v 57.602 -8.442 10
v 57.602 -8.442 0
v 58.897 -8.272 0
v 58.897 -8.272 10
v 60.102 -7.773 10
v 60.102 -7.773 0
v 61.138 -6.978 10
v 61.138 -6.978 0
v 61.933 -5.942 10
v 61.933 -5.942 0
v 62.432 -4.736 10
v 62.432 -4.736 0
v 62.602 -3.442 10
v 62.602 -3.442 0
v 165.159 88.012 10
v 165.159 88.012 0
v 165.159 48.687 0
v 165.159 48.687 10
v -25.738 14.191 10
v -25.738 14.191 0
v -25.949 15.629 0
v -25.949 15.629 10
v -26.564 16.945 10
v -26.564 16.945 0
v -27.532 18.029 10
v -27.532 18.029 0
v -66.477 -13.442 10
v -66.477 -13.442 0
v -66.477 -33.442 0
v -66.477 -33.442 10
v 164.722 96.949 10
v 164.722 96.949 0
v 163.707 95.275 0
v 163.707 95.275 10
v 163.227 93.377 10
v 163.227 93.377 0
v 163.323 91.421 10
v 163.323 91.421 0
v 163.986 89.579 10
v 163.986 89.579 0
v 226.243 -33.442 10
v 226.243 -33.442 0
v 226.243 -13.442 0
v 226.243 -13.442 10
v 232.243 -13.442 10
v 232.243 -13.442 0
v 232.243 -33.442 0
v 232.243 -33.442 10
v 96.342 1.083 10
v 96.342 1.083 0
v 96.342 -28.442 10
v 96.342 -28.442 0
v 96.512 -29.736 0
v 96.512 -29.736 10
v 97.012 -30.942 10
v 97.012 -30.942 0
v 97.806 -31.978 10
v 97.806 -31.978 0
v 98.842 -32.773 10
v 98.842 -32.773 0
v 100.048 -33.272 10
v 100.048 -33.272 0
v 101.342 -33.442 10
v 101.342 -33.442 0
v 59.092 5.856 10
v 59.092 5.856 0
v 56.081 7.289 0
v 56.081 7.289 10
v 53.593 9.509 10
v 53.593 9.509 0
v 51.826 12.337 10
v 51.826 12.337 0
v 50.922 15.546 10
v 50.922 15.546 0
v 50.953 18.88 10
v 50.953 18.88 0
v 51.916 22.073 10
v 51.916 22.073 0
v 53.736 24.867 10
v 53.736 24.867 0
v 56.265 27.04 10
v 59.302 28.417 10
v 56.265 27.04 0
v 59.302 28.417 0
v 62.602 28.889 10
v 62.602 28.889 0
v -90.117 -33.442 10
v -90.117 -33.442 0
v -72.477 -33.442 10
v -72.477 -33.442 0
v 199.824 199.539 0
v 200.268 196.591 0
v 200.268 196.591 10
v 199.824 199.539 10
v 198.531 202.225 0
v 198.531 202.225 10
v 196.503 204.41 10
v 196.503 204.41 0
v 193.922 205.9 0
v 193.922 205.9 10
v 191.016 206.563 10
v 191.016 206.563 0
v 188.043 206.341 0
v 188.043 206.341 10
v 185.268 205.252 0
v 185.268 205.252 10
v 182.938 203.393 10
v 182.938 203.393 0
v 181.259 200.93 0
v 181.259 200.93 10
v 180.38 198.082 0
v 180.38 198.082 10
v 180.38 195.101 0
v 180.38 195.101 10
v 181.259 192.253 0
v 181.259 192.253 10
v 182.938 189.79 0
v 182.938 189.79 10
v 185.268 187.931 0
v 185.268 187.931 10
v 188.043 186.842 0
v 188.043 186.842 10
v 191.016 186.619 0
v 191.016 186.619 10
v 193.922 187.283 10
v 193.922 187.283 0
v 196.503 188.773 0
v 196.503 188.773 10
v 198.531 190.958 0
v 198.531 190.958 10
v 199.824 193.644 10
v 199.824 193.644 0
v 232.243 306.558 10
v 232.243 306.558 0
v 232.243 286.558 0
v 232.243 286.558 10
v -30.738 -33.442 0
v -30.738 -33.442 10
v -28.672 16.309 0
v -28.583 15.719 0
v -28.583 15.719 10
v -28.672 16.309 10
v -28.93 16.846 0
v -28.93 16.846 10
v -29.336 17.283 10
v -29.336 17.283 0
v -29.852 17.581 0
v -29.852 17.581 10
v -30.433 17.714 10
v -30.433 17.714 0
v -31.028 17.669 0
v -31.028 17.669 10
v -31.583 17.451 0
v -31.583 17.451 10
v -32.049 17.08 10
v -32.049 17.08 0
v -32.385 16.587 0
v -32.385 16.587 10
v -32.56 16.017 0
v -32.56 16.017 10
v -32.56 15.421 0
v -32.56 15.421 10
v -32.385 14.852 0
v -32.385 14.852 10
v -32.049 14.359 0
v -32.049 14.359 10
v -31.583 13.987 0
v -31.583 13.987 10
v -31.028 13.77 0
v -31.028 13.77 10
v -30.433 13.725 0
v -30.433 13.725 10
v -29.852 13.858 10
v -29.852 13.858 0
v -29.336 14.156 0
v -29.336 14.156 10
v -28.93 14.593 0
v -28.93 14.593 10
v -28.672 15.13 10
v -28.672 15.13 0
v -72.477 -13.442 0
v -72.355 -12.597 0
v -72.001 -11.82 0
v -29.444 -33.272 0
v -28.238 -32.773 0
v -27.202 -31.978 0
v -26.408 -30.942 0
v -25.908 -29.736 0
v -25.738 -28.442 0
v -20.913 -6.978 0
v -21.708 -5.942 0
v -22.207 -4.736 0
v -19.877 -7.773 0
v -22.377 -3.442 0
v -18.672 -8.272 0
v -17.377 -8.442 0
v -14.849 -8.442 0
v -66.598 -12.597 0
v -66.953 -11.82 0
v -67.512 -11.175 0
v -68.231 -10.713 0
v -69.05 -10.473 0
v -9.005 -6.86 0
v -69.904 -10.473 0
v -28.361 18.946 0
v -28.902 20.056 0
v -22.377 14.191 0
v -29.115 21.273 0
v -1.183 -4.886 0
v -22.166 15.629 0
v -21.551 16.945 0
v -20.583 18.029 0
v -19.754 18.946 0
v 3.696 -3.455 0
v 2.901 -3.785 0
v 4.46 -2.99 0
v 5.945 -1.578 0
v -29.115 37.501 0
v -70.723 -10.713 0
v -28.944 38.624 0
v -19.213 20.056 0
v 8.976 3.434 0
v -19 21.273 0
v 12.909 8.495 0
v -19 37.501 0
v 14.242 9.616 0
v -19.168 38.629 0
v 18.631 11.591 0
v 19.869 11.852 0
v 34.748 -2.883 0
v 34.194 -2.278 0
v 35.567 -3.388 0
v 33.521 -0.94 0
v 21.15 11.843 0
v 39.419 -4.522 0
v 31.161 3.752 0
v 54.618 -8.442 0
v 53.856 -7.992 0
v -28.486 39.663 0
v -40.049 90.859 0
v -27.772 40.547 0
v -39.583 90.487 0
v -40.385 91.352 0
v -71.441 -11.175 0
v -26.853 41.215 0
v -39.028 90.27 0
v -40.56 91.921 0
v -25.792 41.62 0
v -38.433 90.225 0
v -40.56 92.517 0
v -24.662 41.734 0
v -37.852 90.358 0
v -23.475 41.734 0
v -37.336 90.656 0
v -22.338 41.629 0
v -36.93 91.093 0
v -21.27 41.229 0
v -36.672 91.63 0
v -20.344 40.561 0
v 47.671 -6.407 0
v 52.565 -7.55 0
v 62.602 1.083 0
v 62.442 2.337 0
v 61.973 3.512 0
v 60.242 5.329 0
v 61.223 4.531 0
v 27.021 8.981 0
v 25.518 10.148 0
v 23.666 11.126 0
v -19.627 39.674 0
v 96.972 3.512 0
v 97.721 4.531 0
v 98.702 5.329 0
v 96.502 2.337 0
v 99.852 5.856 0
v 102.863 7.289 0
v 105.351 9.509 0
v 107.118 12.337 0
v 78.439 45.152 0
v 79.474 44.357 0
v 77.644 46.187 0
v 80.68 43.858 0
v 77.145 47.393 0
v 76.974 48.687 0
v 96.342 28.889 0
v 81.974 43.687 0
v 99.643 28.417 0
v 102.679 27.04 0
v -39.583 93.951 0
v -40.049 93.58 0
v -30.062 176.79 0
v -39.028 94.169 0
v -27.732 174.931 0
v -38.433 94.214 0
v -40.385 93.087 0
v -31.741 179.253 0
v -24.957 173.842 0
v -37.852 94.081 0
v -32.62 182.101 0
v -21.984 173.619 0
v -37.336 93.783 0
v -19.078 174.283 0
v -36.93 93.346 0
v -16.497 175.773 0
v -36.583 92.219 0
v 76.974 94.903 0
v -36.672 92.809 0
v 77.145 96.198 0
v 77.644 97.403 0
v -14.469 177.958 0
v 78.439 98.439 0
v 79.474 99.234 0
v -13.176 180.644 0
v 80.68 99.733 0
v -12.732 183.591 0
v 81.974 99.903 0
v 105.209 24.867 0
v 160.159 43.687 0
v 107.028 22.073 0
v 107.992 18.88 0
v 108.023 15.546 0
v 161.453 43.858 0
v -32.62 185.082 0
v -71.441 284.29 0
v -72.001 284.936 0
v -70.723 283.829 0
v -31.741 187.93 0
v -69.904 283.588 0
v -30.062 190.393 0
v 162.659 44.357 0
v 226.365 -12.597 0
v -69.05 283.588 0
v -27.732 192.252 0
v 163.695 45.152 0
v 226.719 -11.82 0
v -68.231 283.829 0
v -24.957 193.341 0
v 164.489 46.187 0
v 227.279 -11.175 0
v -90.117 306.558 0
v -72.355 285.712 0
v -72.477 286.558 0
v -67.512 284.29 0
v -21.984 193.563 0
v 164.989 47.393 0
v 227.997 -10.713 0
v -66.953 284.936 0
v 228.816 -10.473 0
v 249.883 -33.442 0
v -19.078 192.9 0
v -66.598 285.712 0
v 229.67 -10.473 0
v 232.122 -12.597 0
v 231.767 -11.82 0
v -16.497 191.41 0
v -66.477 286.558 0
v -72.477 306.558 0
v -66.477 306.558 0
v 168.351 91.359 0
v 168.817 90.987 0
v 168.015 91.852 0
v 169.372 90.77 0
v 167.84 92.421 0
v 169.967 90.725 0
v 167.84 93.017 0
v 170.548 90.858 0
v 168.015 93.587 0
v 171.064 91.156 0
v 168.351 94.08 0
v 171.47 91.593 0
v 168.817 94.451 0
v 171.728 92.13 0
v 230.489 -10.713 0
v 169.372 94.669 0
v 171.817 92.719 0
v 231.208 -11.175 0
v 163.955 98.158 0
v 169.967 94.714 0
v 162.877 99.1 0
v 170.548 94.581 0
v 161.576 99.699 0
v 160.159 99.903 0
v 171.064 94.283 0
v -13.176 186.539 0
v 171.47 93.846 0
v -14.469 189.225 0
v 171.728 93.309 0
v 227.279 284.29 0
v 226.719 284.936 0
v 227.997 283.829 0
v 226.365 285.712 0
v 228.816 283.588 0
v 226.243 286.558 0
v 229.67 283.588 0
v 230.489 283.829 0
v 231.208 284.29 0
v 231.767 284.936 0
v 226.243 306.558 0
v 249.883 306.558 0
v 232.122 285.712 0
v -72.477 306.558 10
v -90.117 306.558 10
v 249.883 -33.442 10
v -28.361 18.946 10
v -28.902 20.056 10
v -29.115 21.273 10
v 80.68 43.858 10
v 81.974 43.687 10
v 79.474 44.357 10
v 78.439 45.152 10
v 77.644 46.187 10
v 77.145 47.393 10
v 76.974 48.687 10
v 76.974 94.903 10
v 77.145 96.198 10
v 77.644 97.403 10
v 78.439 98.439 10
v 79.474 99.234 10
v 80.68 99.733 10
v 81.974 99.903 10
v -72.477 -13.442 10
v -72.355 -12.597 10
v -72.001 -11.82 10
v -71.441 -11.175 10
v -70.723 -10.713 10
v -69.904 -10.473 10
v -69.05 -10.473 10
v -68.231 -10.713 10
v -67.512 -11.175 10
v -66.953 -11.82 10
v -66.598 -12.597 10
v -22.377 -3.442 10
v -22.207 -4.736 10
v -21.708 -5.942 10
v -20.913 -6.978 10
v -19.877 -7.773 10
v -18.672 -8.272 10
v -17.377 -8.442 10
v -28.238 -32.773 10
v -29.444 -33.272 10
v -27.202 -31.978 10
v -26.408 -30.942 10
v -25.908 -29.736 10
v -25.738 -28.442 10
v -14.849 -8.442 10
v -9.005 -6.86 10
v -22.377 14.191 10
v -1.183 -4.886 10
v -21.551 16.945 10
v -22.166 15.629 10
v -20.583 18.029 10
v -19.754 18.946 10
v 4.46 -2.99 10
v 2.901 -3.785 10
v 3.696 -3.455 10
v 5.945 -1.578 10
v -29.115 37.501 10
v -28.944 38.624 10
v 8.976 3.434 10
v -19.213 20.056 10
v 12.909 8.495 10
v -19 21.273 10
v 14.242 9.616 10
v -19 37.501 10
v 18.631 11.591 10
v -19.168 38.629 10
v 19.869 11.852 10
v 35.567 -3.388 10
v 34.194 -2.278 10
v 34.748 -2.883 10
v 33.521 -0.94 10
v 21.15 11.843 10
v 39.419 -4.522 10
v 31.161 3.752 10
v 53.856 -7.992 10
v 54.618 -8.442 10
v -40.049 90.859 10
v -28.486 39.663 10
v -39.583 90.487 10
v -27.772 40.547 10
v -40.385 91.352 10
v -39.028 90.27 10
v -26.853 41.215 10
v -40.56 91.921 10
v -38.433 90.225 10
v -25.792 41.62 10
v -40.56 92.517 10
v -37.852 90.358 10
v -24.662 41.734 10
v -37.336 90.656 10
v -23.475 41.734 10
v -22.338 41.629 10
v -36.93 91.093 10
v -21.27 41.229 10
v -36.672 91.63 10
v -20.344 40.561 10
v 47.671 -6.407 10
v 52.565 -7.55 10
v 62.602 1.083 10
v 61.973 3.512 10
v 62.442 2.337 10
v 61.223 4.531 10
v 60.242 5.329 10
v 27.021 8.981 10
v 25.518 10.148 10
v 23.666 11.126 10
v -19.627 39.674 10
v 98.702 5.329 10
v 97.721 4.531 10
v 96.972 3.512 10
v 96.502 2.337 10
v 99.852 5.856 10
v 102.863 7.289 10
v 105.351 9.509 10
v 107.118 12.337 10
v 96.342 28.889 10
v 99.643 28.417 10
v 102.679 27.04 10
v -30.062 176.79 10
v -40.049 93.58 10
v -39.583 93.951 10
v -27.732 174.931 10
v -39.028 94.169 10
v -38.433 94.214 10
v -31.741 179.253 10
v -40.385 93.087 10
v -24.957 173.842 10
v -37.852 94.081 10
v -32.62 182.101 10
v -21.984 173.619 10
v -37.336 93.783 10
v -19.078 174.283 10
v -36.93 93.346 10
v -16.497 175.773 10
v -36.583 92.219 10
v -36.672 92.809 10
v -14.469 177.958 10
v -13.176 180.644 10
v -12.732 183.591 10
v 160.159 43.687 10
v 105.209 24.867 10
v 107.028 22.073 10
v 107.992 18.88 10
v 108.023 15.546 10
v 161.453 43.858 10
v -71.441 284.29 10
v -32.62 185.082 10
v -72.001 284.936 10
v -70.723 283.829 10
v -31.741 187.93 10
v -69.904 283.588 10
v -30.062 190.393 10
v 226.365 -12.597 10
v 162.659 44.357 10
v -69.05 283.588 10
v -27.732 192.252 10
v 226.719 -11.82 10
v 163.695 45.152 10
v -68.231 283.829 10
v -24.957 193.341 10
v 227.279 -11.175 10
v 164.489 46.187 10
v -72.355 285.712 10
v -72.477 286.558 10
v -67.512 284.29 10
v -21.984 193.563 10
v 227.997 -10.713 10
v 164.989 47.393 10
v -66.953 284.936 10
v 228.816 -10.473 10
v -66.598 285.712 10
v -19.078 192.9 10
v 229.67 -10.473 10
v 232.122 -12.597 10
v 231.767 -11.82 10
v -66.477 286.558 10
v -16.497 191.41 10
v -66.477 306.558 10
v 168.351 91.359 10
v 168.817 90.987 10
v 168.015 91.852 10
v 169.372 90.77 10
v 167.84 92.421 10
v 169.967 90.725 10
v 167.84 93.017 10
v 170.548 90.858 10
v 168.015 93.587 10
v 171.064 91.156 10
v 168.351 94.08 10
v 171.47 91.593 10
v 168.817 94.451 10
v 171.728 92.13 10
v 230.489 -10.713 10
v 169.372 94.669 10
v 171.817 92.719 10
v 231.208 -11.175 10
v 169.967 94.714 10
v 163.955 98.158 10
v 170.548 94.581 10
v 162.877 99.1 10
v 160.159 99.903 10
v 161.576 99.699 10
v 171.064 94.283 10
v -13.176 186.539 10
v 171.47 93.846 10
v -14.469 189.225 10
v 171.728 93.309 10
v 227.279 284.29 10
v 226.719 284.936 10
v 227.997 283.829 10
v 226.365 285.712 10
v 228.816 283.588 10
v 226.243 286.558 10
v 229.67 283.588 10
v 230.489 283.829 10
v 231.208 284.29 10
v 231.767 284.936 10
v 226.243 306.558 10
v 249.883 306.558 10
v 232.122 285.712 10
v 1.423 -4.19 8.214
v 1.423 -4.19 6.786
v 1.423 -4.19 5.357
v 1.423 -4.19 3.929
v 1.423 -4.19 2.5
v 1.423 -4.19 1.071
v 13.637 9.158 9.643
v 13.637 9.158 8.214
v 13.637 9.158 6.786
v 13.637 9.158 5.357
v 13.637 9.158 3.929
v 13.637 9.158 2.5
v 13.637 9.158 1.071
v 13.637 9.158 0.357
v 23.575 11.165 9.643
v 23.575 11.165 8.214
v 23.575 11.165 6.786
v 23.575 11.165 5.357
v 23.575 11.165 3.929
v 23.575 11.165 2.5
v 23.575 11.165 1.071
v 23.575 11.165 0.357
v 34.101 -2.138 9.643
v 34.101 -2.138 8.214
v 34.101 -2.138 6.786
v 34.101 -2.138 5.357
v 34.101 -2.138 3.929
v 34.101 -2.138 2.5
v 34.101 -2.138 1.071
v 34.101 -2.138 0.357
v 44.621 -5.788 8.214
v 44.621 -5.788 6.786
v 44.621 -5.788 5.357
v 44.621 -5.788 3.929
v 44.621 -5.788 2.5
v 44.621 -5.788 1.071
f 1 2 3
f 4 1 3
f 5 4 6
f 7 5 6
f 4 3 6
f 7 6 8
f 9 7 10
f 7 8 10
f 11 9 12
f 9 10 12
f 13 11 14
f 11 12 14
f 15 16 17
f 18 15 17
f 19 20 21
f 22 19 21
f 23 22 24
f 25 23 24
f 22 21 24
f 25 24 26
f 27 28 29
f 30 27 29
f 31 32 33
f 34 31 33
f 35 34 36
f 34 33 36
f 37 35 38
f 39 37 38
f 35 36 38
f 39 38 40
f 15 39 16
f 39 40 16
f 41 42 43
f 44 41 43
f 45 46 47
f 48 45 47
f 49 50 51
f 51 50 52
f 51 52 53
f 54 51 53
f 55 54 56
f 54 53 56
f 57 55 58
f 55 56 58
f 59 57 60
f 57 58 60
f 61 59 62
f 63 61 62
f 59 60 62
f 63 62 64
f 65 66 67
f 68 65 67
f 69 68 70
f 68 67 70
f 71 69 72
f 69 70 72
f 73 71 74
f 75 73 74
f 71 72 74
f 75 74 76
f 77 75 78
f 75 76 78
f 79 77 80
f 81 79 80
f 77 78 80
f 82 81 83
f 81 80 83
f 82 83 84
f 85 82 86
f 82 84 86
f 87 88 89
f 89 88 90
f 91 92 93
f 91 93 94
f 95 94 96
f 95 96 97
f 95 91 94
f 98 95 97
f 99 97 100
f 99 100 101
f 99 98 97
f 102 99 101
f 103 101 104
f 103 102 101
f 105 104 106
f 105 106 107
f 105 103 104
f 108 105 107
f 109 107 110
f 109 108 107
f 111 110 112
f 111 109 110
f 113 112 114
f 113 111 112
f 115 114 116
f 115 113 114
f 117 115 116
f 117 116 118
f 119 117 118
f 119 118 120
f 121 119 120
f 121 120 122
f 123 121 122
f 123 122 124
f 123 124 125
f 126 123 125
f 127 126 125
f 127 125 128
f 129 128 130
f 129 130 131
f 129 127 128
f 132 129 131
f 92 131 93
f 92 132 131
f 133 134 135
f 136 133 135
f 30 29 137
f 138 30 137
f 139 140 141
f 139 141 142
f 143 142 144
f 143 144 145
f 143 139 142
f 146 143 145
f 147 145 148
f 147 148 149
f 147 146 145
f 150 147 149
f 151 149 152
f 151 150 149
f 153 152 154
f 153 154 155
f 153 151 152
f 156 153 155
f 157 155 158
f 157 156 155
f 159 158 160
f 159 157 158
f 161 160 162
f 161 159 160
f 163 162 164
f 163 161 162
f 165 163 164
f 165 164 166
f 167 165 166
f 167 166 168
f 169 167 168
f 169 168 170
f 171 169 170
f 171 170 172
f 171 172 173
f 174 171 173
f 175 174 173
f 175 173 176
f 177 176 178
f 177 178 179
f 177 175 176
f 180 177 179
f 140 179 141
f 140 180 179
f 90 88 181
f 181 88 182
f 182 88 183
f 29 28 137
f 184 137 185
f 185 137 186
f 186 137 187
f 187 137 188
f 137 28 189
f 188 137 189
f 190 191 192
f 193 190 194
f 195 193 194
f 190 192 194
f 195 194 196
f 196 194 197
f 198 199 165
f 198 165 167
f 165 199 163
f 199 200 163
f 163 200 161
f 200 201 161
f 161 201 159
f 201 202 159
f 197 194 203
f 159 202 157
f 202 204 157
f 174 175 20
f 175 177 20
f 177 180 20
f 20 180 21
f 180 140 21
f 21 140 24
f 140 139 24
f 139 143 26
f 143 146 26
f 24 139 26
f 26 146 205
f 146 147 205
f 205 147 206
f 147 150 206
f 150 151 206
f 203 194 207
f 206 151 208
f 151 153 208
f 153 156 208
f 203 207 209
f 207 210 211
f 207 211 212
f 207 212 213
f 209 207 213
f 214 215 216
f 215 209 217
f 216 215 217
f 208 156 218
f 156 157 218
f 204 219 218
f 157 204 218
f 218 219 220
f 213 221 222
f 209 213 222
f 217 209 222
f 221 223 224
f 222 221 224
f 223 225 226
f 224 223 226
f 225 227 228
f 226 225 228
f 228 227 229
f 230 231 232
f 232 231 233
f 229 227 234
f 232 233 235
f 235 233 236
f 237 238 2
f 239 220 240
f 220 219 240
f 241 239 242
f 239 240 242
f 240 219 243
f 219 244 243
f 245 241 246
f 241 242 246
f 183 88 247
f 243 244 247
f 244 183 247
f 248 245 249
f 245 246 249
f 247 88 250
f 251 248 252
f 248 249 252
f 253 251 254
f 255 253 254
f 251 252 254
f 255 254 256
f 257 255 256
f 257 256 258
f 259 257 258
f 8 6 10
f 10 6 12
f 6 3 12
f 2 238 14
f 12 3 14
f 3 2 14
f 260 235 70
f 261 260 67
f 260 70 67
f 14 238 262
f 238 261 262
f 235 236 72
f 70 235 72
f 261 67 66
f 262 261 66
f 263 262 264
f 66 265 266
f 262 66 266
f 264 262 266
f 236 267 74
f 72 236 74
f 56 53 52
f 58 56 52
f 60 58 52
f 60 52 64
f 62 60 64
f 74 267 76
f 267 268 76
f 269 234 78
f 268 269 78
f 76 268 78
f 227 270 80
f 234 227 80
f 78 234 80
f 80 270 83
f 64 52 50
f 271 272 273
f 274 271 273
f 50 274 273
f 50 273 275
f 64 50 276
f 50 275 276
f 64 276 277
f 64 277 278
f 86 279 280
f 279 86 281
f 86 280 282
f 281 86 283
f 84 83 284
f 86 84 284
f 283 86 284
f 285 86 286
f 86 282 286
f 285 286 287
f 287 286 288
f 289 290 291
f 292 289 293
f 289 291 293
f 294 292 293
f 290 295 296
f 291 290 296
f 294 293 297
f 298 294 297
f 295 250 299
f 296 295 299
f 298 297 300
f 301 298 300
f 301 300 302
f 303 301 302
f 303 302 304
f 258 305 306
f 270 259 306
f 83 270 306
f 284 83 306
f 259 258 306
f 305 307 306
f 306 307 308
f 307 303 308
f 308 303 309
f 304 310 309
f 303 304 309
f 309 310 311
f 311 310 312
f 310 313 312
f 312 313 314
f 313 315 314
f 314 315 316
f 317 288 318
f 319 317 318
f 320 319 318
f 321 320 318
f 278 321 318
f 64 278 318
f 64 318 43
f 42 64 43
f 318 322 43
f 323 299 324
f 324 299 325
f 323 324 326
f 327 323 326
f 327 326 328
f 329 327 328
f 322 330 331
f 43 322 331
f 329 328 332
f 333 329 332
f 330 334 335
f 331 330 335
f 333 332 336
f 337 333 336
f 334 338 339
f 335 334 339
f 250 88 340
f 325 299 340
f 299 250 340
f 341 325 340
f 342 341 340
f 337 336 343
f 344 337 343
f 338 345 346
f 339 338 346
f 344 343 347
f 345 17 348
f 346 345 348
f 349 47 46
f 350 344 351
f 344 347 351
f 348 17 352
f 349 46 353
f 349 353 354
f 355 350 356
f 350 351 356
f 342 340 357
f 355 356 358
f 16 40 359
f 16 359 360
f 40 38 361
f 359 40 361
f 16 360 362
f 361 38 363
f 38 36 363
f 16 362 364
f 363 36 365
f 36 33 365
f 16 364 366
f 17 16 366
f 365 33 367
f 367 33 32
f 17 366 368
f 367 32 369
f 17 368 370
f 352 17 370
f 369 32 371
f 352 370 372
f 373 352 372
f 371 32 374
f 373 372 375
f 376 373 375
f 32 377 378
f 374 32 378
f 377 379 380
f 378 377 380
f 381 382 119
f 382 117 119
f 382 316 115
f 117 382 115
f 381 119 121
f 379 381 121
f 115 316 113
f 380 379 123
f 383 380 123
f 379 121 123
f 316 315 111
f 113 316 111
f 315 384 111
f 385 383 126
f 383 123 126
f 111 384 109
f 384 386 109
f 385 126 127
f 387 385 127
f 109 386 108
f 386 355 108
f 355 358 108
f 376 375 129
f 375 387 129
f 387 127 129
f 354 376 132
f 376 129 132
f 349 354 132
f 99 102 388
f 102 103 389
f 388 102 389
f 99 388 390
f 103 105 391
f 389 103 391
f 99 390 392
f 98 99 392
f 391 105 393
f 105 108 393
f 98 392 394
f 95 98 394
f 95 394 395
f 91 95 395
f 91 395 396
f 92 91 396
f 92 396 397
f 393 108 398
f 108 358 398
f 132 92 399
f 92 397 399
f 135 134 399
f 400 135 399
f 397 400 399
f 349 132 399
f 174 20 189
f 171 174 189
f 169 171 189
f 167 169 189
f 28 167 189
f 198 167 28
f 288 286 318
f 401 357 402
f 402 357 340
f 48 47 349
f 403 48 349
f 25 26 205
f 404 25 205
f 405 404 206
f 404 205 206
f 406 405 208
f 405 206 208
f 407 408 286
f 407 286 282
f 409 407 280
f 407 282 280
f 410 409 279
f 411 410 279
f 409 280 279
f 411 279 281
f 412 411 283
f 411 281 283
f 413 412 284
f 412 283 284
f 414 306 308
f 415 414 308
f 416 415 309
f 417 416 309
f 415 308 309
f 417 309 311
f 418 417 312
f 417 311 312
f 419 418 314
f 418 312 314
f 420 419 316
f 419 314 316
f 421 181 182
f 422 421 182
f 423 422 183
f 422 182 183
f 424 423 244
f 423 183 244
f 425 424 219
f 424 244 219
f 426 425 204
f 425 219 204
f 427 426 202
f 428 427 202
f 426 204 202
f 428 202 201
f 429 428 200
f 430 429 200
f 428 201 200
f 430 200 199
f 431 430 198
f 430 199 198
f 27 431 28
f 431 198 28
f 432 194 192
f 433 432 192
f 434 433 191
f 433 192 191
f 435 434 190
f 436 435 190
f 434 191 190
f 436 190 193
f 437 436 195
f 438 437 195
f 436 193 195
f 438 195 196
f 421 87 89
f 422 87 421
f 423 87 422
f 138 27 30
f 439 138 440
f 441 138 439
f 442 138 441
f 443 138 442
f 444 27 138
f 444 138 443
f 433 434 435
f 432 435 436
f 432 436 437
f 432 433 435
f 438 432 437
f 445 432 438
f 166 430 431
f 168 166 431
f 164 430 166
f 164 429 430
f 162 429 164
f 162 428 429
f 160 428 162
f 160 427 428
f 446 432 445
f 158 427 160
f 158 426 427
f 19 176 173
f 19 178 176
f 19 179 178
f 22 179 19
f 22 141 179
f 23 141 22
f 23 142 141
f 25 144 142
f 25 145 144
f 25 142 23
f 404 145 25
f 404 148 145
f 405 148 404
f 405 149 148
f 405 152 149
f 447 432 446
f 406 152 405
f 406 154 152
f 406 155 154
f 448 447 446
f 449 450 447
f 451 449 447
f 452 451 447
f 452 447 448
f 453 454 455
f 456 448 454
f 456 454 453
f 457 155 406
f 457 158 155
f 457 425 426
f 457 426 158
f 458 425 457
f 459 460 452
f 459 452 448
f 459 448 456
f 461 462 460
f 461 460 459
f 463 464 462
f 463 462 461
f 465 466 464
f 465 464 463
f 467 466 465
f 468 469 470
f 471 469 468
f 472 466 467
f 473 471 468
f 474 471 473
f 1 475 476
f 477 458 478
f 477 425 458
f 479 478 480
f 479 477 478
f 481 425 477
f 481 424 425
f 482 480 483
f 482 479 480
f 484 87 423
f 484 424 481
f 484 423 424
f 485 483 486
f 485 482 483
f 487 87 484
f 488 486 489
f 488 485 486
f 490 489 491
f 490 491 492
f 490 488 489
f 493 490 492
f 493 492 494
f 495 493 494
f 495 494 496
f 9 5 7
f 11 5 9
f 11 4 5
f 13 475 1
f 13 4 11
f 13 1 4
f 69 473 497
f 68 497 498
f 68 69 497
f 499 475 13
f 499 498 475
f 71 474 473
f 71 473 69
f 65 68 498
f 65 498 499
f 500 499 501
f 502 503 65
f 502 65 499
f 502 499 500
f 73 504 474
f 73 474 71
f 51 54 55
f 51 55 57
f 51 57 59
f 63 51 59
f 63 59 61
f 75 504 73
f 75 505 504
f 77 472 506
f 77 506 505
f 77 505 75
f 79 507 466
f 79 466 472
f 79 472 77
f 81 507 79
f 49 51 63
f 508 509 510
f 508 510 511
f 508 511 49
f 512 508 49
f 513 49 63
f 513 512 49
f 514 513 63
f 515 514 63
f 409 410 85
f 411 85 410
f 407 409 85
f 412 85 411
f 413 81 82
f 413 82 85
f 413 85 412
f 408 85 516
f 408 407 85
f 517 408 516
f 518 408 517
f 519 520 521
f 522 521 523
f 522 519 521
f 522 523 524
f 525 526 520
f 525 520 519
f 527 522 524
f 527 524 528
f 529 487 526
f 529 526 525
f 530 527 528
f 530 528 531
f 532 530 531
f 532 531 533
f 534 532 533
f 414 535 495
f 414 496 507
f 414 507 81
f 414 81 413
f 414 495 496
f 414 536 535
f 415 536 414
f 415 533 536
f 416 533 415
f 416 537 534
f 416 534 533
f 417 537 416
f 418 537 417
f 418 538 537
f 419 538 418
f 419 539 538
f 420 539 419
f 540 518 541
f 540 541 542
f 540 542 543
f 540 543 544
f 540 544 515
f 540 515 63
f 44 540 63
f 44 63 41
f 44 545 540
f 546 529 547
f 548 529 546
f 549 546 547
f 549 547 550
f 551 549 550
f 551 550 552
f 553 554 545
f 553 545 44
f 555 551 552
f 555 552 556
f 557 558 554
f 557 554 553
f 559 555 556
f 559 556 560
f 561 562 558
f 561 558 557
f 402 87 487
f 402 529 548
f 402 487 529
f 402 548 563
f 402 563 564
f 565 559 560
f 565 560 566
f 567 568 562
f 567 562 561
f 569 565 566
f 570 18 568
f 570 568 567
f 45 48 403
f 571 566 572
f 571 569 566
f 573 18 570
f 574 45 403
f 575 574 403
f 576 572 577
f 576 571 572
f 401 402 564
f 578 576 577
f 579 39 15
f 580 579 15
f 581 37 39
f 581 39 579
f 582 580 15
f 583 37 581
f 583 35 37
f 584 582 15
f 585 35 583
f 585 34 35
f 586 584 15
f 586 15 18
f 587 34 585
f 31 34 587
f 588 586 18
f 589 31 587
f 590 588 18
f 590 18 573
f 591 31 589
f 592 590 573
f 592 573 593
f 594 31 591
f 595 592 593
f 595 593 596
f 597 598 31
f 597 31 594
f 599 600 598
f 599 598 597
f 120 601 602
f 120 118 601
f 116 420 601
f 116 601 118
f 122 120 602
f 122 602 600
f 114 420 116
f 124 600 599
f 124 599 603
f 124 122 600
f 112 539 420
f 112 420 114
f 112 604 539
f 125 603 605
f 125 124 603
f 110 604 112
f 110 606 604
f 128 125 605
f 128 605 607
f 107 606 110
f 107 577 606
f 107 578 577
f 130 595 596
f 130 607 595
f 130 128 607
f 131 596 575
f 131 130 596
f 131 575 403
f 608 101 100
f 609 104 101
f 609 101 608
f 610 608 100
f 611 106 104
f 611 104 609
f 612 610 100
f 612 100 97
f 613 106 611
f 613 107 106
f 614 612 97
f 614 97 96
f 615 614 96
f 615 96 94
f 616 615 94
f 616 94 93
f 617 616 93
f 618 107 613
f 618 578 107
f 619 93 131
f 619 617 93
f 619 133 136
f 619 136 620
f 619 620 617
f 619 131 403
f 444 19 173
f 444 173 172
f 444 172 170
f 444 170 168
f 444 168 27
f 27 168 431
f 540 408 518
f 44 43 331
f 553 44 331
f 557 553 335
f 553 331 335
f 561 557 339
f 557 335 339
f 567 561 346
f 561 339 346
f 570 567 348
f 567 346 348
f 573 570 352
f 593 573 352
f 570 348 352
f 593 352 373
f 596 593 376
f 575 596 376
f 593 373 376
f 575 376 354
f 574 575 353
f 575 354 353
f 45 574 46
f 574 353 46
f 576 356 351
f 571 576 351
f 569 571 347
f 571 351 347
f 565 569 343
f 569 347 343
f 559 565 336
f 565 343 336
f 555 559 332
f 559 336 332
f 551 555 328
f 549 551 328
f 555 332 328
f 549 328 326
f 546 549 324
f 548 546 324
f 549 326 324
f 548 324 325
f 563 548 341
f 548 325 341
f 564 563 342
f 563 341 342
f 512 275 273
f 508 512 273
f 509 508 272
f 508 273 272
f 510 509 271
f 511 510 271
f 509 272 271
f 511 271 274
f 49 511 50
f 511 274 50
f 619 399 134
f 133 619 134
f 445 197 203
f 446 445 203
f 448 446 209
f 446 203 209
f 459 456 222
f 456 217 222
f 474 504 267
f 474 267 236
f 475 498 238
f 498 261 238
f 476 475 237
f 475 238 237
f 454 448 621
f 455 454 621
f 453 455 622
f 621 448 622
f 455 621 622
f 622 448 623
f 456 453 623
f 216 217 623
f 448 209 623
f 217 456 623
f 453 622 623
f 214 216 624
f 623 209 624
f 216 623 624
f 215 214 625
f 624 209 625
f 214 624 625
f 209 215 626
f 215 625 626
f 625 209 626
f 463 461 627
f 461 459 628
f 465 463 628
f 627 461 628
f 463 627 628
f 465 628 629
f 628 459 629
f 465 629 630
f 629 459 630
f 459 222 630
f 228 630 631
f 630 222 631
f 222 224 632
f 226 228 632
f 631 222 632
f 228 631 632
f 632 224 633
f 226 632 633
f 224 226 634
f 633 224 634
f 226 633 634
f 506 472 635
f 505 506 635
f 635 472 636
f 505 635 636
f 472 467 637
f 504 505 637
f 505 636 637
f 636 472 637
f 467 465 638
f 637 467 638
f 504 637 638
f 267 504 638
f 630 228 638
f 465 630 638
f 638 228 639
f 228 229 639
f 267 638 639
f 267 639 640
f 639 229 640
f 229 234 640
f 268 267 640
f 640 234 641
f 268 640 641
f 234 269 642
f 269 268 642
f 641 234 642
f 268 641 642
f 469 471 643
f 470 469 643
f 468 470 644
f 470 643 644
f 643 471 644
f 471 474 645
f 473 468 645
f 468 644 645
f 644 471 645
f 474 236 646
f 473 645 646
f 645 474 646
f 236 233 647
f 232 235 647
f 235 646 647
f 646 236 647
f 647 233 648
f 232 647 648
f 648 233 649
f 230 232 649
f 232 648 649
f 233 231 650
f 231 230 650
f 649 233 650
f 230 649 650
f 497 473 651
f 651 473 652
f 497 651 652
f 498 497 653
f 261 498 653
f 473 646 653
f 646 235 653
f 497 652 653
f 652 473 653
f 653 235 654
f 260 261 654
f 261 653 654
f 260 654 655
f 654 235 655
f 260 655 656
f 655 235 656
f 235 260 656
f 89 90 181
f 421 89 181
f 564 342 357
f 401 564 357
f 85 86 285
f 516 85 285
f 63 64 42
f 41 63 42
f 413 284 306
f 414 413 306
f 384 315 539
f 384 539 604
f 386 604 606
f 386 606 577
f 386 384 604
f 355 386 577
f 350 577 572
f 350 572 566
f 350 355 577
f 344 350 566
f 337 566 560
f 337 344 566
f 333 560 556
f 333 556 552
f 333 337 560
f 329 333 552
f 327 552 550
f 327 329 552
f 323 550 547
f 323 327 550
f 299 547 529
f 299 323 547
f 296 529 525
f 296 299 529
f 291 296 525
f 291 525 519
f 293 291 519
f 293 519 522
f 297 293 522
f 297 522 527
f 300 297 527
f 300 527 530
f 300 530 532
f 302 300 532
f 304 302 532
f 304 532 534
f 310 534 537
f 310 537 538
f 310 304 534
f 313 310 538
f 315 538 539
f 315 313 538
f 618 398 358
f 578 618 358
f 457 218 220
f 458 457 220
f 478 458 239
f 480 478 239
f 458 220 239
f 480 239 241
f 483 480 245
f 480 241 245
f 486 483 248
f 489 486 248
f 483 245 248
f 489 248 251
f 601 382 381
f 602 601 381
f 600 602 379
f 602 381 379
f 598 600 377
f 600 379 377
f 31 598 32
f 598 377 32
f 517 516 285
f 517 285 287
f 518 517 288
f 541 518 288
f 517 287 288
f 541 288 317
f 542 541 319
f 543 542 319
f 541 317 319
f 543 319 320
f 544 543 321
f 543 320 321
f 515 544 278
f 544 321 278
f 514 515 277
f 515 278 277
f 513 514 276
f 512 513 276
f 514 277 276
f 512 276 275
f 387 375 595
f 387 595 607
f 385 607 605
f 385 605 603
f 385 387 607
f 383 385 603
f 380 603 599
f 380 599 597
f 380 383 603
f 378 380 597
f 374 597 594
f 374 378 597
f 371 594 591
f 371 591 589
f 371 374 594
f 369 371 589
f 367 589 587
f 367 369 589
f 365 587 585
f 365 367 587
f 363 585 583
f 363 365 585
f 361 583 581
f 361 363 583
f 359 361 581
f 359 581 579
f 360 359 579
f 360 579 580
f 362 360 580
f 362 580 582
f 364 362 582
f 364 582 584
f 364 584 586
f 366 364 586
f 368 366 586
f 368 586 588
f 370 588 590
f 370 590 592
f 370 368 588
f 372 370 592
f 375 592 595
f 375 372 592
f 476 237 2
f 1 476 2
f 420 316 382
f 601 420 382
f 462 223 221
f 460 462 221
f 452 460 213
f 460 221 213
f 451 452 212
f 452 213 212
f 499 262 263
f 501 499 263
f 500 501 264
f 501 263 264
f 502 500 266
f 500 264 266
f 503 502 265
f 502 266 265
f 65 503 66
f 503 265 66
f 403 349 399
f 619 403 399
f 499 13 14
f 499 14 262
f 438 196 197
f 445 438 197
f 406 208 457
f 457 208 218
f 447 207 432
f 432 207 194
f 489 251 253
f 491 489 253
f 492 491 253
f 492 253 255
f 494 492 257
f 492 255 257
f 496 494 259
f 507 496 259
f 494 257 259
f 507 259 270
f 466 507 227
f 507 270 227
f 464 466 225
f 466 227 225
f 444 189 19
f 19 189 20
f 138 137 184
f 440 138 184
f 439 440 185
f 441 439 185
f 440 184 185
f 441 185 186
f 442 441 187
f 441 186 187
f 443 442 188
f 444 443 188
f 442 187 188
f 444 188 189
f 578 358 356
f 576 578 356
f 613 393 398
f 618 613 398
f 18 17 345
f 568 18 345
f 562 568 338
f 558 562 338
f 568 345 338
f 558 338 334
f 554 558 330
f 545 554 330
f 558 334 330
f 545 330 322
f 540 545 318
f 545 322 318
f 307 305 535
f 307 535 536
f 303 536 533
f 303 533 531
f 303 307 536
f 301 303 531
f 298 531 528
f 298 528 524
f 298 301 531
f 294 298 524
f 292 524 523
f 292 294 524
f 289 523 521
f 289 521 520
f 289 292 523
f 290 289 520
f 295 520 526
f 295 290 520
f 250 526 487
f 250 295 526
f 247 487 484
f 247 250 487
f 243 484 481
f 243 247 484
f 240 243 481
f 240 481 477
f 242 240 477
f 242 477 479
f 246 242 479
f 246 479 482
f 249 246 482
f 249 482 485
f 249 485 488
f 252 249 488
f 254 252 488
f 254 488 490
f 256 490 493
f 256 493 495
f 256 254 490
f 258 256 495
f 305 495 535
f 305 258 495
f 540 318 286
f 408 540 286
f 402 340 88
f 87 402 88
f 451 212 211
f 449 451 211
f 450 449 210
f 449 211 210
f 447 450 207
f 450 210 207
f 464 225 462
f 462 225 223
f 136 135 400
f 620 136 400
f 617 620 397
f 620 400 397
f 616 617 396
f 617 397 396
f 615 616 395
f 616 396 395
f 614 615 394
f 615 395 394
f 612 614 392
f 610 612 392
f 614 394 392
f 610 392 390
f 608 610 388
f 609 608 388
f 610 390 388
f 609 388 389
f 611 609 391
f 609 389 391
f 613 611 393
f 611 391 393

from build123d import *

# Parameters (mm, degrees)
F0_R     = 2
F0_R_2   = 10
F1_DEPTH = 10


with BuildPart() as f1:
    # F0 (on Top) → F1 (new body)
    with BuildSketch(Plane.XY):
        with BuildLine():
            ThreePointArc((59.0919412169, 5.8556343452), (50.9526831397, 18.8804236674), (62.6024537054, 28.8891950556))
            Line((62.6024537054, 28.8891950556), (96.3418013123, 28.8891950556))
            ThreePointArc((96.3418013123, 28.8891950556), (107.991571878, 18.8804236674), (99.8523138008, 5.8556343452))
            ThreePointArc((99.8523138008, 5.8556343452), (97.3139335415, 4.0451239333), (96.3418013123, 1.0826450353))
            Line((96.3418013123, 1.0826450353), (96.3418013123, -3.4423905863))
            Line((96.3418013123, -3.4423905863), (96.3418013123, -28.4423905863))
            ThreePointArc((96.3418013123, -28.4423905863), (97.8062674064, -31.9779244922), (101.3418013123, -33.4423905863))
            Line((101.3418013123, -33.4423905863), (226.2431738165, -33.4423905863))
            Line((226.2431738165, -33.4423905863), (226.2431738165, -13.4423905863))
            ThreePointArc((226.2431738165, -13.4423905863), (229.2431738165, -10.4423905863), (232.2431738165, -13.4423905863))
            Line((232.2431738165, -13.4423905863), (232.2431738165, -33.4423905863))
            Line((232.2431738165, -33.4423905863), (249.8831738165, -33.4423905863))
            Line((249.8831738165, -33.4423905863), (249.8831738165, 306.5576094137))
            Line((249.8831738165, 306.5576094137), (232.2431738165, 306.5576094137))
            Line((232.2431738165, 306.5576094137), (232.2431738165, 286.5576094137))
            ThreePointArc((232.2431738165, 286.5576094137), (229.2431738165, 283.5576094137), (226.2431738165, 286.5576094137))
            Line((226.2431738165, 286.5576094137), (226.2431738165, 306.5576094137))
            Line((226.2431738165, 306.5576094137), (-66.4768261835, 306.5576094137))
            Line((-66.4768261835, 306.5576094137), (-66.4768261835, 286.5576094137))
            ThreePointArc((-66.4768261835, 286.5576094137), (-69.4768261835, 283.5576094137), (-72.4768261835, 286.5576094137))
            Line((-72.4768261835, 286.5576094137), (-72.4768261835, 306.5576094137))
            Line((-72.4768261835, 306.5576094137), (-90.1168261835, 306.5576094137))
            Line((-90.1168261835, 306.5576094137), (-90.1168261835, -33.4423905863))
            Line((-90.1168261835, -33.4423905863), (-72.4768261835, -33.4423905863))
            Line((-72.4768261835, -33.4423905863), (-72.4768261835, -13.4423905863))
            ThreePointArc((-72.4768261835, -13.4423905863), (-69.4768261835, -10.4423905863), (-66.4768261835, -13.4423905863))
            Line((-66.4768261835, -13.4423905863), (-66.4768261835, -33.4423905863))
            Line((-66.4768261835, -33.4423905863), (-30.7376475201, -33.4423905863))
            ThreePointArc((-30.7376475201, -33.4423905863), (-27.2021136142, -31.9779244922), (-25.7376475201, -28.4423905863))
            Line((-25.7376475201, -28.4423905863), (-25.7376475201, -3.4423905863))
            Line((-25.7376475201, -3.4423905863), (-25.7376475201, 14.191206688))
            ThreePointArc((-25.7376475201, 14.191206688), (-26.2085251586, 16.3094726378), (-27.5324677739, 18.0287609605))
            ThreePointArc((-27.5324677739, 18.0287609605), (-28.6705546596, 19.4817524546), (-29.1154945201, 21.2729683997))
            Line((-29.1154945201, 21.2729683997), (-29.1154945201, 37.5007453997))
            ThreePointArc((-29.1154945201, 37.5007453997), (-27.7723228668, 40.5471780201), (-24.6616755201, 41.7340793997))
            Line((-24.6616755201, 41.7340793997), (-23.4746474021, 41.7340793997))
            ThreePointArc((-23.4746474021, 41.7340793997), (-20.3442550444, 40.5612593781), (-18.9995925201, 37.5007453997))
            Line((-18.9995925201, 37.5007453997), (-18.9995925201, 21.2729683997))
            ThreePointArc((-18.9995925201, 21.2729683997), (-19.4445332952, 19.4817460524), (-20.5826230269, 18.0287486149))
            ThreePointArc((-20.5826230269, 18.0287486149), (-21.9065629195, 16.309461214), (-22.3774395201, 14.1911974832))
            Line((-22.3774395201, 14.1911974832), (-22.3774395201, -3.4423905863))
            ThreePointArc((-22.3774395201, -3.4423905863), (-20.9129734261, -6.9779244922), (-17.3774395201, -8.4423905863))
            Line((-17.3774395201, -8.4423905863), (-14.8488045963, -8.4423905863))
            add(Edge.make_bspline(
                [(-14.8488045963, -8.4423905863), (-13.8667230742, -8.0862149232), (-11.0675263436, -7.7368565701), (-9.5535565702, -6.9407787949), (-7.4752239657, -6.5093979511), (-6.0404658852, -6.1311557916), (-2.2864787406, -5.2030128278), (1.3475701923, -4.1847297196), (3.5611082397, -3.6822645324), (5.4819881536, -2.2869521331), (6.9236147383, -0.2928338043), (8.0909212332, 2.1536809326), (8.8018252555, 3.1130183139), (9.9066433173, 5.0149117757), (13.4740067588, 9.5337311578), (16.6201320308, 10.8141732124), (20.2607813027, 12.3757075827), (24.1416225167, 11.0663557699), (26.5751124317, 9.5057386468), (28.5212647481, 7.4945031555), (30.605514445, 4.8352932594), (31.5134198263, 3.0744433993), (32.6181776868, 1.1006609746), (33.5937461444, -1.0781289854), (34.6061736564, -3.5356368183), (40.2319928309, -4.632963348), (44.5783336596, -5.860680116), (49.0997891973, -6.6293952633), (53.6165002005, -7.7718986182), (54.4082808854, -8.2668507233), (54.6180656818, -8.4423905863)],
                knots=[0, 0, 0, 0, 0.0406361494, 0.0690843533, 0.0982832849, 0.1240792745, 0.1650586975, 0.2064474949, 0.237602636, 0.2688839918, 0.3023509551, 0.3363941823, 0.3586454287, 0.3892430987, 0.4390503332, 0.478234315, 0.5186842811, 0.5600640859, 0.5954673894, 0.6306059239, 0.6688365072, 0.6984296576, 0.7295419634, 0.7618620205, 0.7940667479, 0.8425634492, 0.8880772951, 0.9338149024, 0.9784648643, 1, 1, 1, 1], degree=3))
            Line((54.6180656818, -8.4423905863), (57.6024537054, -8.4423905863))
            ThreePointArc((57.6024537054, -8.4423905863), (61.1379876113, -6.9779244922), (62.6024537054, -3.4423905863))
            Line((62.6024537054, -3.4423905863), (62.6024537054, 1.0826450353))
            ThreePointArc((62.6024537054, 1.0826450353), (61.6303214762, 4.0451239333), (59.0919412169, 5.8556343452))
        make_face()
        with Locations((-30.5828261835, 15.7193741869)):
            Circle(F0_R, mode=Mode.SUBTRACT)
        with Locations((-38.5828261835, 92.2193741869)):
            Circle(F0_R, mode=Mode.SUBTRACT)
        with BuildLine():
            ThreePointArc((76.9742517439, 94.9034886555), (78.438717838, 98.4390225614), (81.9742517439, 99.9034886555))
            Line((81.9742517439, 99.9034886555), (160.1593125132, 99.9034886555))
            ThreePointArc((160.1593125132, 99.9034886555), (162.8768793148, 99.1004912382), (164.7215664672, 96.949420927))
            ThreePointArc((164.7215664672, 96.949420927), (163.2025267349, 92.3954086529), (165.1593125132, 88.0116318659))
            Line((165.1593125132, 88.0116318659), (165.1593125132, 48.6874424414))
            ThreePointArc((165.1593125132, 48.6874424414), (163.6948464191, 45.1519085355), (160.1593125132, 43.6874424414))
            Line((160.1593125132, 43.6874424414), (81.9742517439, 43.6874424414))
            ThreePointArc((81.9742517439, 43.6874424414), (78.438717838, 45.1519085355), (76.9742517439, 48.6874424414))
            Line((76.9742517439, 48.6874424414), (76.9742517439, 94.9034886555))
        make_face(mode=Mode.SUBTRACT)
        with Locations((169.8171738165, 92.7193741869)):
            Circle(F0_R, mode=Mode.SUBTRACT)
        with Locations((-22.7316567036, 183.5914050536)):
            Circle(F0_R_2, mode=Mode.SUBTRACT)
        with Locations((190.2683432964, 196.5914050536)):
            Circle(F0_R_2, mode=Mode.SUBTRACT)
    extrude(amount=F1_DEPTH)


solid = f1.part
